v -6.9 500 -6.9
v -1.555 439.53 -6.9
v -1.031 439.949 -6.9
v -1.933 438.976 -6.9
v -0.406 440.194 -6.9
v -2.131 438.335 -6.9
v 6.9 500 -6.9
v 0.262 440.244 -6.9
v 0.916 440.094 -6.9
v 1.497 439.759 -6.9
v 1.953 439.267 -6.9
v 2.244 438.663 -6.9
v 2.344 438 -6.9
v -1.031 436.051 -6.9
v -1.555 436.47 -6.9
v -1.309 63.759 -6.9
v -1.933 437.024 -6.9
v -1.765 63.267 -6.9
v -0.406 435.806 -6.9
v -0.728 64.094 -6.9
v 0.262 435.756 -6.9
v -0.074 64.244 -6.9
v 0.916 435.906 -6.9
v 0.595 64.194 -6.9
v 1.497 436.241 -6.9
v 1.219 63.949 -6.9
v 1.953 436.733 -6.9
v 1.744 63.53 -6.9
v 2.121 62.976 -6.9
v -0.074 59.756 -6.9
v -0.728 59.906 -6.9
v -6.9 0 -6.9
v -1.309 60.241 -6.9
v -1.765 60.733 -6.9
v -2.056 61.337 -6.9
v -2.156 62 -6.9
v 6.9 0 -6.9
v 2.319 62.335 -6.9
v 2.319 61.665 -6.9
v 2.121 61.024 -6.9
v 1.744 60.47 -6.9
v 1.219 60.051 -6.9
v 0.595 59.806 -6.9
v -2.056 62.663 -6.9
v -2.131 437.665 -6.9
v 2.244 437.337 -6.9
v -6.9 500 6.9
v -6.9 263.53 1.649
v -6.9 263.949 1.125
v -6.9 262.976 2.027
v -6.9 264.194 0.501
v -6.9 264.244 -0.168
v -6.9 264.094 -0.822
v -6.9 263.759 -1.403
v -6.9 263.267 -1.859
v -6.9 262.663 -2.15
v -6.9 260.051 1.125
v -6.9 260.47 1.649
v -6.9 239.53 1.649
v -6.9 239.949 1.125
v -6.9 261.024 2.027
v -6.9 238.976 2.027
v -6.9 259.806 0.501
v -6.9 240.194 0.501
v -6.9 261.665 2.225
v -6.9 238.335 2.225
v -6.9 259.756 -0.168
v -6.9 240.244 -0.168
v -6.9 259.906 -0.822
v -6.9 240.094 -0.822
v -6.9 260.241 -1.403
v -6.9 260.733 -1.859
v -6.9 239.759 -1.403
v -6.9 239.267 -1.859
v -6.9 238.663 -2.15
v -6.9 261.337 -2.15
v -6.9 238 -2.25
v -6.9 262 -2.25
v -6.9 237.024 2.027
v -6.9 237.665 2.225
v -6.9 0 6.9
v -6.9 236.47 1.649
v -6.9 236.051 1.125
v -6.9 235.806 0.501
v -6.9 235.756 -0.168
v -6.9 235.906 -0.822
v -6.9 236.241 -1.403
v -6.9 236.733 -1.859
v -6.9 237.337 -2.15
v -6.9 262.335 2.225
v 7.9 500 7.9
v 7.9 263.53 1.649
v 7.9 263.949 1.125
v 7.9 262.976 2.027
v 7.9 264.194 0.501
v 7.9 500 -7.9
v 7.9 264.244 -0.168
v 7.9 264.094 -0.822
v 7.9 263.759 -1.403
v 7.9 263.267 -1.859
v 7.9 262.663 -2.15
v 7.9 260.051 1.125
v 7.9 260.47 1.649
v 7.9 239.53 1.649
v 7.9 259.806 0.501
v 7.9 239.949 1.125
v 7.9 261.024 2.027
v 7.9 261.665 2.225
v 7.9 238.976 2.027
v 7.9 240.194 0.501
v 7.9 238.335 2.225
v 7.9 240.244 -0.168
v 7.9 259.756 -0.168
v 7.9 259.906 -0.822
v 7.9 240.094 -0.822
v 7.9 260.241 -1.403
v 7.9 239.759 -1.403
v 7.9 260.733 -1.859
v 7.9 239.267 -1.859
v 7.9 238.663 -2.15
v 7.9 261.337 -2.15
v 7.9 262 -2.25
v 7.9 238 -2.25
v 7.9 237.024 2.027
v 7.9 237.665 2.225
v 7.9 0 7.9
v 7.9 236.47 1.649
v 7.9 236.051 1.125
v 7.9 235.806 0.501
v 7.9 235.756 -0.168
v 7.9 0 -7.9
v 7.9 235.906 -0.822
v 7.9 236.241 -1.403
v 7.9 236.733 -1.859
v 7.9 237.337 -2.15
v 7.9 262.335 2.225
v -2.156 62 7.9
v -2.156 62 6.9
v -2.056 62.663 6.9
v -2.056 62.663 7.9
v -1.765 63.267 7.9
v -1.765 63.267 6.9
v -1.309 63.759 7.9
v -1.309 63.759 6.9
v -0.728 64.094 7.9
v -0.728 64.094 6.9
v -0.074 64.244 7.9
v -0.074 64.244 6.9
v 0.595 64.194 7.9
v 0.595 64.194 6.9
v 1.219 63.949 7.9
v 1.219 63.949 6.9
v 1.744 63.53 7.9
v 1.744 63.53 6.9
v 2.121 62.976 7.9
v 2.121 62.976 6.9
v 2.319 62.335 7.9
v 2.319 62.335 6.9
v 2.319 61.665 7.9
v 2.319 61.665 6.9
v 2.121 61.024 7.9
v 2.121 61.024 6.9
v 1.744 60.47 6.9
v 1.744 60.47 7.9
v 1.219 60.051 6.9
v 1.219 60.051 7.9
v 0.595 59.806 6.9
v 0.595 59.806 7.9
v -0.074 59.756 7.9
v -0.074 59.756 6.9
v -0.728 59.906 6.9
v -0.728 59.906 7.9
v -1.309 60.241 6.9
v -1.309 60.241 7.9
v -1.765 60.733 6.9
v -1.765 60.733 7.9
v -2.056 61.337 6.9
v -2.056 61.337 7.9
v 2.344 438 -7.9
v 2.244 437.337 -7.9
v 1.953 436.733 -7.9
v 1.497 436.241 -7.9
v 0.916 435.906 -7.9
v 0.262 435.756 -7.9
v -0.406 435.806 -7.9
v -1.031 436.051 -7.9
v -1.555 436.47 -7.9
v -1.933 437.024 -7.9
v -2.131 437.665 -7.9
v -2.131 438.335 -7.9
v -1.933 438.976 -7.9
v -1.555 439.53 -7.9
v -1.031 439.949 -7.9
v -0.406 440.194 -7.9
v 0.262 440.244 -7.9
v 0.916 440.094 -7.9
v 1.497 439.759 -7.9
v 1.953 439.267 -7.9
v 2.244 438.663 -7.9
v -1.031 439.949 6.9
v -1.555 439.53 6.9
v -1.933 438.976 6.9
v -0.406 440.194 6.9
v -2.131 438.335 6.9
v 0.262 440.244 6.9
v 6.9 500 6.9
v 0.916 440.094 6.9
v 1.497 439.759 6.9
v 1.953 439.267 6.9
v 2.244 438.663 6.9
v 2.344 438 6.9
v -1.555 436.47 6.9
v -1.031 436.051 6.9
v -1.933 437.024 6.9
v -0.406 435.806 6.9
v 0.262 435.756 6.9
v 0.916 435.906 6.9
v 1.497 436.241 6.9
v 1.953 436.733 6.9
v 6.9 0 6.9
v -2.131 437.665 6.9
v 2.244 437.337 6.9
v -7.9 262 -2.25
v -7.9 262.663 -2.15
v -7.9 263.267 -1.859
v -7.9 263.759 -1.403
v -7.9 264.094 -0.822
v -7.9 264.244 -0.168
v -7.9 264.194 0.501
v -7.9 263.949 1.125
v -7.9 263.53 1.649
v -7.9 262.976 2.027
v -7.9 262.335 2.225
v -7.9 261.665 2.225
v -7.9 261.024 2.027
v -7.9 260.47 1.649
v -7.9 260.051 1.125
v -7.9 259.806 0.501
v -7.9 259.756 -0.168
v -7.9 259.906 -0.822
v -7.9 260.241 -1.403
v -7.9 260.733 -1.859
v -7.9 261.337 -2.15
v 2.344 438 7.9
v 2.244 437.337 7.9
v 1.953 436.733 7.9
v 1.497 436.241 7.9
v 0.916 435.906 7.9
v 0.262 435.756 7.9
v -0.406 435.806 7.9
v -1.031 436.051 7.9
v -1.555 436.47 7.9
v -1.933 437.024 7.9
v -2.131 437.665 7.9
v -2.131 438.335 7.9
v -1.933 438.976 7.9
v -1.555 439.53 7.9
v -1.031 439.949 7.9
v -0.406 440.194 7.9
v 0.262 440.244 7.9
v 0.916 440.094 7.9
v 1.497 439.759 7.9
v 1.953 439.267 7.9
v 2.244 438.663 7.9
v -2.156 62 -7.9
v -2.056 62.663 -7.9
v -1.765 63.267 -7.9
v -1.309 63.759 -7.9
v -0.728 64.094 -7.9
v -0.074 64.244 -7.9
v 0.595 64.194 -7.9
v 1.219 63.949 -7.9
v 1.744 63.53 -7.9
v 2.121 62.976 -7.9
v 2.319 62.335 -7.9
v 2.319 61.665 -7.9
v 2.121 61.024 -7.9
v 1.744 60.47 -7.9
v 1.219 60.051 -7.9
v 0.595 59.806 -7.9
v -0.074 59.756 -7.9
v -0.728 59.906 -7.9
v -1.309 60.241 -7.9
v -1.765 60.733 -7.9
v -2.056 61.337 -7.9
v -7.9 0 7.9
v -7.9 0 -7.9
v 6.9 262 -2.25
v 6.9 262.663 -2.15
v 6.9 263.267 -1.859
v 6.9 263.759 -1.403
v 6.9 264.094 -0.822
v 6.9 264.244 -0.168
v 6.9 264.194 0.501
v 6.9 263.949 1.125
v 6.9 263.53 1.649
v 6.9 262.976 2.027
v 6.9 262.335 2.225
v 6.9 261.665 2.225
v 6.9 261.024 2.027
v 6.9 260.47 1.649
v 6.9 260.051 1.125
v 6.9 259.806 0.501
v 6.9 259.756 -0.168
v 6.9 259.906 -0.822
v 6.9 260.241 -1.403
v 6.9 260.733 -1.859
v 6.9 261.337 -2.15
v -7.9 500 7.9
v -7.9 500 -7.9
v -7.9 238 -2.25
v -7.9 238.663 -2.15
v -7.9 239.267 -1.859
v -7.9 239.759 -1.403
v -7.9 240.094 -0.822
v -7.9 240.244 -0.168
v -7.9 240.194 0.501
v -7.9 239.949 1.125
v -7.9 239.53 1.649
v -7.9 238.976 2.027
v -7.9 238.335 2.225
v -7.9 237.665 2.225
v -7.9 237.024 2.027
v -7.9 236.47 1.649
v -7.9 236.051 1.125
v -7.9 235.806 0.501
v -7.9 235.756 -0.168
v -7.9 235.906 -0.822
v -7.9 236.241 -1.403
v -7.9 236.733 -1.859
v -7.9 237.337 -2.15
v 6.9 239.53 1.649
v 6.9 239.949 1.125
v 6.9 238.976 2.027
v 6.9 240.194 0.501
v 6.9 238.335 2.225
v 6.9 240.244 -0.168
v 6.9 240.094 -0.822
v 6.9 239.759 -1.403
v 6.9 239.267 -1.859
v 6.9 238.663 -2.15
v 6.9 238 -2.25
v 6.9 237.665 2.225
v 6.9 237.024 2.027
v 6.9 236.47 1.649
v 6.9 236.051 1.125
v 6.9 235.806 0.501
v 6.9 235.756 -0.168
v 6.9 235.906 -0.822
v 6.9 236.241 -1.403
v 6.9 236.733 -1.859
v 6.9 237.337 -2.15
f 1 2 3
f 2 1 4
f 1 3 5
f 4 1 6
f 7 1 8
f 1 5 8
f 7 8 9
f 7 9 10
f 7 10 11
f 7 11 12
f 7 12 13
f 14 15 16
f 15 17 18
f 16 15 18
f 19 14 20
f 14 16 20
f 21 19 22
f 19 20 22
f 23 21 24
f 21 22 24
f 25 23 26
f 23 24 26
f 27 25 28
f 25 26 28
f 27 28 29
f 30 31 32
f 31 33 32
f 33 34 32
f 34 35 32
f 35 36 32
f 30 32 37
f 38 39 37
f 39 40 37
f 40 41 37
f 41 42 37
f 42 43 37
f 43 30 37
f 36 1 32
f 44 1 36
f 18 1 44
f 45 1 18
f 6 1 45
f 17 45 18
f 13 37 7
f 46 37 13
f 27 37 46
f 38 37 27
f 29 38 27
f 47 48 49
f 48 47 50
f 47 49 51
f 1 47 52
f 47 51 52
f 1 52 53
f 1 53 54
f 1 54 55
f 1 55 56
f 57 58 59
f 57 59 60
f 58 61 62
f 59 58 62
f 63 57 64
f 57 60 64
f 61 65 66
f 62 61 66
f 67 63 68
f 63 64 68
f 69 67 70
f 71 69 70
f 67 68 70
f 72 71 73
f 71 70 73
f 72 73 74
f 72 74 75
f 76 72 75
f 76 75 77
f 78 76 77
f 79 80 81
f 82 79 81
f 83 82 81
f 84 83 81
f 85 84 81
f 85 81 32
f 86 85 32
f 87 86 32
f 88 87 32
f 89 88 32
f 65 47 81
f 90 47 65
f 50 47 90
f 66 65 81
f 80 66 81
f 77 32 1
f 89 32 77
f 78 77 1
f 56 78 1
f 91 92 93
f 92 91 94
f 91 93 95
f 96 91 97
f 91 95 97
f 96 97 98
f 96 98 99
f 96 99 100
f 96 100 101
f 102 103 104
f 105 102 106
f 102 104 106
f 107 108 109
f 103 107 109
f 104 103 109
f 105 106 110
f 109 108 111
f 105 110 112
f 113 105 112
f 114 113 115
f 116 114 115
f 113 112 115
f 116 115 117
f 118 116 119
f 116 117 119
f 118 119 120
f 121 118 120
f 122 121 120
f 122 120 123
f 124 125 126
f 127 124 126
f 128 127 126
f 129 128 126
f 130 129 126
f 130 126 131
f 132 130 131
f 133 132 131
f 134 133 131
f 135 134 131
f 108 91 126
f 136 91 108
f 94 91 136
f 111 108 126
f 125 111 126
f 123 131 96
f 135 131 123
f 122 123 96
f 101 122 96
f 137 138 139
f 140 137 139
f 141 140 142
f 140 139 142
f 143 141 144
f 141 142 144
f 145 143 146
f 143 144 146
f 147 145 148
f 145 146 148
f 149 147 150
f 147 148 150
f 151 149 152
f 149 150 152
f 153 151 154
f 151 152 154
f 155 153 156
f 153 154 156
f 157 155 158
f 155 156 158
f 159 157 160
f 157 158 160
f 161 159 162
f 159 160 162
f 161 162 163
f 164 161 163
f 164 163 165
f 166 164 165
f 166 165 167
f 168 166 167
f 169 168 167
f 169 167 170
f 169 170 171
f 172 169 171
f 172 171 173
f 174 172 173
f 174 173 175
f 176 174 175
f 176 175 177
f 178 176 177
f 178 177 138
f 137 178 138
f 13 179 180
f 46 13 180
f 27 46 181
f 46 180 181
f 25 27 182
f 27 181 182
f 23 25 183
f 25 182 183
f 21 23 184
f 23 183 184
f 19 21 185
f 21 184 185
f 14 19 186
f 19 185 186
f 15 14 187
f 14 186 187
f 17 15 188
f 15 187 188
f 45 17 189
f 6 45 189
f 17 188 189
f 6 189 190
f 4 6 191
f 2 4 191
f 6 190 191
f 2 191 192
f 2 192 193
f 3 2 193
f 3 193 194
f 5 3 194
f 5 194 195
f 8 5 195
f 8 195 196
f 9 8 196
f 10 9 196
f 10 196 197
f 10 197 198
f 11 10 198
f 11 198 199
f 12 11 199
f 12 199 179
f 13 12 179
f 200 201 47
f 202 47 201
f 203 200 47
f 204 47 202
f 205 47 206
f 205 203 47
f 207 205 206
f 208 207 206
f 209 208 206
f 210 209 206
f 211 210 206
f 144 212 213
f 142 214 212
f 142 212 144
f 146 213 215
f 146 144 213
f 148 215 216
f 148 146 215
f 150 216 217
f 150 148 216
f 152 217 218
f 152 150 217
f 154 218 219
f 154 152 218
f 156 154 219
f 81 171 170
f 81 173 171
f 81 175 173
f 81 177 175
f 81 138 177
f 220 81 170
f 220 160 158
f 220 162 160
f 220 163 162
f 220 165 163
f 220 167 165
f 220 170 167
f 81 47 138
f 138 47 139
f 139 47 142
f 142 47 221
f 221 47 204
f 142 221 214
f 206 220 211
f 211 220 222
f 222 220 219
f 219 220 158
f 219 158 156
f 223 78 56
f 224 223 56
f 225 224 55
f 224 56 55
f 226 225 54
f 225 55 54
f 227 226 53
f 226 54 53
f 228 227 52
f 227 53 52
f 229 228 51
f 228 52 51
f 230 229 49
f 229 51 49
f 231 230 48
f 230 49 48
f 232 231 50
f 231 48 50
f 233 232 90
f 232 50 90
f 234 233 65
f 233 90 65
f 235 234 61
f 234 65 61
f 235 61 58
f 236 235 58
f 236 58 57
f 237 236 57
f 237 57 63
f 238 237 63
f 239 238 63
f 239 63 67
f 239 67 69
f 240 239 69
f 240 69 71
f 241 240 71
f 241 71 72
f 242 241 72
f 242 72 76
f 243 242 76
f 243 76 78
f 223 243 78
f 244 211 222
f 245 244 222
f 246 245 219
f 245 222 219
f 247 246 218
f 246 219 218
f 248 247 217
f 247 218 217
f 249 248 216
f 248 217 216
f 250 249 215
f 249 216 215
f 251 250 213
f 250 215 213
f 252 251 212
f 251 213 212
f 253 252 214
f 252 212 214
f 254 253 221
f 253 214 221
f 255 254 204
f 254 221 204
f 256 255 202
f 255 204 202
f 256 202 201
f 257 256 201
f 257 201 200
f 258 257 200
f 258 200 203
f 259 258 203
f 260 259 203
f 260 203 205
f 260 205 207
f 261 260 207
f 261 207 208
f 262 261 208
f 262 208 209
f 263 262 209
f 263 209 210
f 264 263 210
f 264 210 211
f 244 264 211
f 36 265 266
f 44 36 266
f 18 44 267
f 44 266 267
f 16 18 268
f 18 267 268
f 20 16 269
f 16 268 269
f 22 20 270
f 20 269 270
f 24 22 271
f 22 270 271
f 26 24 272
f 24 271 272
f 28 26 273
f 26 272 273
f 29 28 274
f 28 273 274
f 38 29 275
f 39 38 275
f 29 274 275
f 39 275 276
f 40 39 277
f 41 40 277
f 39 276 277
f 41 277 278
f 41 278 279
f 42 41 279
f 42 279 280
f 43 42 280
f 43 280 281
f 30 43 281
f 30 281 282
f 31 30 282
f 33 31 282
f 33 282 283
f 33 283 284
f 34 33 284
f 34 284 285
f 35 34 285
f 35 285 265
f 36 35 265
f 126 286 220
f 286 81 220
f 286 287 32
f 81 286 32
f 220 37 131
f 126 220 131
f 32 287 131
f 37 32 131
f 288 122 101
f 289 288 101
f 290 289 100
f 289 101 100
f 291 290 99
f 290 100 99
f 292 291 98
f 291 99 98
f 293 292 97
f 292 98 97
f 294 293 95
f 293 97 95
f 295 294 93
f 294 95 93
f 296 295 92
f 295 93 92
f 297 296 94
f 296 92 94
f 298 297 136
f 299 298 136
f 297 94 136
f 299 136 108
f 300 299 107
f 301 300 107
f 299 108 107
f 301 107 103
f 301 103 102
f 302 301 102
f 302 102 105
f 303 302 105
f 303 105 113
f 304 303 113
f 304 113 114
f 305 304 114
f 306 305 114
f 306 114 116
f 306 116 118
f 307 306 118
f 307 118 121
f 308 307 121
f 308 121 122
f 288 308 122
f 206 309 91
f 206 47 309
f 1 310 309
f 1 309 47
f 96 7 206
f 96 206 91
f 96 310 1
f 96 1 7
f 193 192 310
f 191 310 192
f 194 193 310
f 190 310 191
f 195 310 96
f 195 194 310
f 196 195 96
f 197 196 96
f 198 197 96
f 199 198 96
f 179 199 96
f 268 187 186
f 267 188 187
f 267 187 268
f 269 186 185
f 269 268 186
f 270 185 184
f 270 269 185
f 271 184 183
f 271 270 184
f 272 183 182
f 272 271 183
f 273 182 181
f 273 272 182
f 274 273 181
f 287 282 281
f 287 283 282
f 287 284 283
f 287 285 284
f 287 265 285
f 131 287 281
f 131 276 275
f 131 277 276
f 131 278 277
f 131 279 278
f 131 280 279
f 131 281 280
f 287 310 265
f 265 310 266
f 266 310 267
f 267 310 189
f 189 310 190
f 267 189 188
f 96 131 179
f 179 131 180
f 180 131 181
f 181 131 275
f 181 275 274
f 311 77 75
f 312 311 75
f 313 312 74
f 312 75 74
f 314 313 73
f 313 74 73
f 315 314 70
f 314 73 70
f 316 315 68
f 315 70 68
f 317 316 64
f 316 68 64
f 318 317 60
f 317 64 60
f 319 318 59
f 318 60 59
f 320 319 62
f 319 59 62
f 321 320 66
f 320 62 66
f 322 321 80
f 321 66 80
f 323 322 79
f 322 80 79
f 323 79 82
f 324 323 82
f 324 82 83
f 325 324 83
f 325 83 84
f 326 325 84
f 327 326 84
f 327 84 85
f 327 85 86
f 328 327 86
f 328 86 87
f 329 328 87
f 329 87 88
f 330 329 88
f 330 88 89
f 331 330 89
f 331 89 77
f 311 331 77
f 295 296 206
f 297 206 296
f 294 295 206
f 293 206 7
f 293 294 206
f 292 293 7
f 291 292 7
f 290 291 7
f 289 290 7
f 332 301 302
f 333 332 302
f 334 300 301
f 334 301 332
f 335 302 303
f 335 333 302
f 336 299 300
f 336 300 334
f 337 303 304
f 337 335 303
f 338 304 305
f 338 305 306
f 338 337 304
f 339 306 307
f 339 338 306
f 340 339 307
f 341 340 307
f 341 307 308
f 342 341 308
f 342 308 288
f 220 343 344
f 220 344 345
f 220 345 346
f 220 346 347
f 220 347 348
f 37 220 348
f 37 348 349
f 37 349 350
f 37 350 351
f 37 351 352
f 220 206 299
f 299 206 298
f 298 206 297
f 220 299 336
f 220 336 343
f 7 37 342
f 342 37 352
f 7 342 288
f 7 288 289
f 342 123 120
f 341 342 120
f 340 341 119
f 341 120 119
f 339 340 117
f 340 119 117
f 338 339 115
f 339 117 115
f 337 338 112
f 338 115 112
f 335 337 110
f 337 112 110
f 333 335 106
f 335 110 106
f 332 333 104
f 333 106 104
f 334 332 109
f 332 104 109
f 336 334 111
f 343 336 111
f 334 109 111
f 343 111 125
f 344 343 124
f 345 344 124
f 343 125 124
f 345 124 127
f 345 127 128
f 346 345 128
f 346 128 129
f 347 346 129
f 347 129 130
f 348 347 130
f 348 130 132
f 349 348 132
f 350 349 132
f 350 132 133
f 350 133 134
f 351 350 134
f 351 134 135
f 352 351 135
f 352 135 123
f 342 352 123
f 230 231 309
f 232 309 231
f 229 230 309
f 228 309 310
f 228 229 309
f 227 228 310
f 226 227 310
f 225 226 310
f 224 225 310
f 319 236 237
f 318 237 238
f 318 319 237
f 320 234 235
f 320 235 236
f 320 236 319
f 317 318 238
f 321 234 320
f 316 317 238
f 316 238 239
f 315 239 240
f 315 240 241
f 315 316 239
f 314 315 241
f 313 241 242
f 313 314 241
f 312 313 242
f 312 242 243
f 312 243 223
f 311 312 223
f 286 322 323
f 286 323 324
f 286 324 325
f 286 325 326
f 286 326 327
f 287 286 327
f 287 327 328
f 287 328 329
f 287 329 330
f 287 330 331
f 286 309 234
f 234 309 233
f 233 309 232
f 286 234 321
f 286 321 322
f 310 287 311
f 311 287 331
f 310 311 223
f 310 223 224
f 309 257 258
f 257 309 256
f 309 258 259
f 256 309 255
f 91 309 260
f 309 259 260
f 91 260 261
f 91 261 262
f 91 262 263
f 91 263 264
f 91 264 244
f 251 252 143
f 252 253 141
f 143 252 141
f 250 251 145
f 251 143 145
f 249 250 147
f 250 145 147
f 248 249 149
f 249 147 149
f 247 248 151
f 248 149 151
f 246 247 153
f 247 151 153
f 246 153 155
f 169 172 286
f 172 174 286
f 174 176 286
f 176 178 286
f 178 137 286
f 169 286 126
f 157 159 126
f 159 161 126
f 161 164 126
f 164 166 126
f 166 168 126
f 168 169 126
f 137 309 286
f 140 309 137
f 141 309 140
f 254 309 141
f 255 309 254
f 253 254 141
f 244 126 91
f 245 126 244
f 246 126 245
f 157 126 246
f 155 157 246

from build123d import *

# Parameters (mm, degrees)
SKETCH1_W           = 15.8
SKETCH1_H           = 15.8
SKETCH1_W_2         = 13.8
SKETCH1_H_2         = 13.8
BOSS_EXTRUDE2_DEPTH = 500
SKETCH4_R           = 2.25
CUT_EXTRUDE2_DEPTH  = 501.311952686
SKETCH6_R           = 2.25
CUT_EXTRUDE3_DEPTH  = 501.311952686


with BuildPart() as part:
    # Sketch1 → Boss-Extrude2 (new body)
    with BuildSketch(Plane(origin=(0, 0, 0), x_dir=(1, 0, 0), z_dir=(0, 1, 0))):
        Rectangle(SKETCH1_W, SKETCH1_H)
        Rectangle(SKETCH1_W_2, SKETCH1_H_2, mode=Mode.SUBTRACT)
    extrude(amount=BOSS_EXTRUDE2_DEPTH)

    # Sketch4 → Cut-Extrude2 (cut, through all)
    with BuildSketch(Plane(origin=(0, 0, -7.9), x_dir=(-1, 0, 0), z_dir=(0, 0, -1))):
        with Locations(Location((-0.094266251, 438, 0), (0, 0, 180))):
            Circle(SKETCH4_R)
        with Locations((-0.094266251, 62)):
            Circle(SKETCH4_R)
    extrude(amount=-CUT_EXTRUDE2_DEPTH, mode=Mode.SUBTRACT)

    # Sketch6 → Cut-Extrude3 (cut, through all)
    with BuildSketch(Plane(origin=(7.9, 0, 0), x_dir=(0, 0, -1), z_dir=(1, 0, 0))):
        with Locations((0, 262)):
            Circle(SKETCH6_R)
        with Locations((0, 238)):
            Circle(SKETCH6_R)
    extrude(amount=-CUT_EXTRUDE3_DEPTH, mode=Mode.SUBTRACT)


solid = part.part
